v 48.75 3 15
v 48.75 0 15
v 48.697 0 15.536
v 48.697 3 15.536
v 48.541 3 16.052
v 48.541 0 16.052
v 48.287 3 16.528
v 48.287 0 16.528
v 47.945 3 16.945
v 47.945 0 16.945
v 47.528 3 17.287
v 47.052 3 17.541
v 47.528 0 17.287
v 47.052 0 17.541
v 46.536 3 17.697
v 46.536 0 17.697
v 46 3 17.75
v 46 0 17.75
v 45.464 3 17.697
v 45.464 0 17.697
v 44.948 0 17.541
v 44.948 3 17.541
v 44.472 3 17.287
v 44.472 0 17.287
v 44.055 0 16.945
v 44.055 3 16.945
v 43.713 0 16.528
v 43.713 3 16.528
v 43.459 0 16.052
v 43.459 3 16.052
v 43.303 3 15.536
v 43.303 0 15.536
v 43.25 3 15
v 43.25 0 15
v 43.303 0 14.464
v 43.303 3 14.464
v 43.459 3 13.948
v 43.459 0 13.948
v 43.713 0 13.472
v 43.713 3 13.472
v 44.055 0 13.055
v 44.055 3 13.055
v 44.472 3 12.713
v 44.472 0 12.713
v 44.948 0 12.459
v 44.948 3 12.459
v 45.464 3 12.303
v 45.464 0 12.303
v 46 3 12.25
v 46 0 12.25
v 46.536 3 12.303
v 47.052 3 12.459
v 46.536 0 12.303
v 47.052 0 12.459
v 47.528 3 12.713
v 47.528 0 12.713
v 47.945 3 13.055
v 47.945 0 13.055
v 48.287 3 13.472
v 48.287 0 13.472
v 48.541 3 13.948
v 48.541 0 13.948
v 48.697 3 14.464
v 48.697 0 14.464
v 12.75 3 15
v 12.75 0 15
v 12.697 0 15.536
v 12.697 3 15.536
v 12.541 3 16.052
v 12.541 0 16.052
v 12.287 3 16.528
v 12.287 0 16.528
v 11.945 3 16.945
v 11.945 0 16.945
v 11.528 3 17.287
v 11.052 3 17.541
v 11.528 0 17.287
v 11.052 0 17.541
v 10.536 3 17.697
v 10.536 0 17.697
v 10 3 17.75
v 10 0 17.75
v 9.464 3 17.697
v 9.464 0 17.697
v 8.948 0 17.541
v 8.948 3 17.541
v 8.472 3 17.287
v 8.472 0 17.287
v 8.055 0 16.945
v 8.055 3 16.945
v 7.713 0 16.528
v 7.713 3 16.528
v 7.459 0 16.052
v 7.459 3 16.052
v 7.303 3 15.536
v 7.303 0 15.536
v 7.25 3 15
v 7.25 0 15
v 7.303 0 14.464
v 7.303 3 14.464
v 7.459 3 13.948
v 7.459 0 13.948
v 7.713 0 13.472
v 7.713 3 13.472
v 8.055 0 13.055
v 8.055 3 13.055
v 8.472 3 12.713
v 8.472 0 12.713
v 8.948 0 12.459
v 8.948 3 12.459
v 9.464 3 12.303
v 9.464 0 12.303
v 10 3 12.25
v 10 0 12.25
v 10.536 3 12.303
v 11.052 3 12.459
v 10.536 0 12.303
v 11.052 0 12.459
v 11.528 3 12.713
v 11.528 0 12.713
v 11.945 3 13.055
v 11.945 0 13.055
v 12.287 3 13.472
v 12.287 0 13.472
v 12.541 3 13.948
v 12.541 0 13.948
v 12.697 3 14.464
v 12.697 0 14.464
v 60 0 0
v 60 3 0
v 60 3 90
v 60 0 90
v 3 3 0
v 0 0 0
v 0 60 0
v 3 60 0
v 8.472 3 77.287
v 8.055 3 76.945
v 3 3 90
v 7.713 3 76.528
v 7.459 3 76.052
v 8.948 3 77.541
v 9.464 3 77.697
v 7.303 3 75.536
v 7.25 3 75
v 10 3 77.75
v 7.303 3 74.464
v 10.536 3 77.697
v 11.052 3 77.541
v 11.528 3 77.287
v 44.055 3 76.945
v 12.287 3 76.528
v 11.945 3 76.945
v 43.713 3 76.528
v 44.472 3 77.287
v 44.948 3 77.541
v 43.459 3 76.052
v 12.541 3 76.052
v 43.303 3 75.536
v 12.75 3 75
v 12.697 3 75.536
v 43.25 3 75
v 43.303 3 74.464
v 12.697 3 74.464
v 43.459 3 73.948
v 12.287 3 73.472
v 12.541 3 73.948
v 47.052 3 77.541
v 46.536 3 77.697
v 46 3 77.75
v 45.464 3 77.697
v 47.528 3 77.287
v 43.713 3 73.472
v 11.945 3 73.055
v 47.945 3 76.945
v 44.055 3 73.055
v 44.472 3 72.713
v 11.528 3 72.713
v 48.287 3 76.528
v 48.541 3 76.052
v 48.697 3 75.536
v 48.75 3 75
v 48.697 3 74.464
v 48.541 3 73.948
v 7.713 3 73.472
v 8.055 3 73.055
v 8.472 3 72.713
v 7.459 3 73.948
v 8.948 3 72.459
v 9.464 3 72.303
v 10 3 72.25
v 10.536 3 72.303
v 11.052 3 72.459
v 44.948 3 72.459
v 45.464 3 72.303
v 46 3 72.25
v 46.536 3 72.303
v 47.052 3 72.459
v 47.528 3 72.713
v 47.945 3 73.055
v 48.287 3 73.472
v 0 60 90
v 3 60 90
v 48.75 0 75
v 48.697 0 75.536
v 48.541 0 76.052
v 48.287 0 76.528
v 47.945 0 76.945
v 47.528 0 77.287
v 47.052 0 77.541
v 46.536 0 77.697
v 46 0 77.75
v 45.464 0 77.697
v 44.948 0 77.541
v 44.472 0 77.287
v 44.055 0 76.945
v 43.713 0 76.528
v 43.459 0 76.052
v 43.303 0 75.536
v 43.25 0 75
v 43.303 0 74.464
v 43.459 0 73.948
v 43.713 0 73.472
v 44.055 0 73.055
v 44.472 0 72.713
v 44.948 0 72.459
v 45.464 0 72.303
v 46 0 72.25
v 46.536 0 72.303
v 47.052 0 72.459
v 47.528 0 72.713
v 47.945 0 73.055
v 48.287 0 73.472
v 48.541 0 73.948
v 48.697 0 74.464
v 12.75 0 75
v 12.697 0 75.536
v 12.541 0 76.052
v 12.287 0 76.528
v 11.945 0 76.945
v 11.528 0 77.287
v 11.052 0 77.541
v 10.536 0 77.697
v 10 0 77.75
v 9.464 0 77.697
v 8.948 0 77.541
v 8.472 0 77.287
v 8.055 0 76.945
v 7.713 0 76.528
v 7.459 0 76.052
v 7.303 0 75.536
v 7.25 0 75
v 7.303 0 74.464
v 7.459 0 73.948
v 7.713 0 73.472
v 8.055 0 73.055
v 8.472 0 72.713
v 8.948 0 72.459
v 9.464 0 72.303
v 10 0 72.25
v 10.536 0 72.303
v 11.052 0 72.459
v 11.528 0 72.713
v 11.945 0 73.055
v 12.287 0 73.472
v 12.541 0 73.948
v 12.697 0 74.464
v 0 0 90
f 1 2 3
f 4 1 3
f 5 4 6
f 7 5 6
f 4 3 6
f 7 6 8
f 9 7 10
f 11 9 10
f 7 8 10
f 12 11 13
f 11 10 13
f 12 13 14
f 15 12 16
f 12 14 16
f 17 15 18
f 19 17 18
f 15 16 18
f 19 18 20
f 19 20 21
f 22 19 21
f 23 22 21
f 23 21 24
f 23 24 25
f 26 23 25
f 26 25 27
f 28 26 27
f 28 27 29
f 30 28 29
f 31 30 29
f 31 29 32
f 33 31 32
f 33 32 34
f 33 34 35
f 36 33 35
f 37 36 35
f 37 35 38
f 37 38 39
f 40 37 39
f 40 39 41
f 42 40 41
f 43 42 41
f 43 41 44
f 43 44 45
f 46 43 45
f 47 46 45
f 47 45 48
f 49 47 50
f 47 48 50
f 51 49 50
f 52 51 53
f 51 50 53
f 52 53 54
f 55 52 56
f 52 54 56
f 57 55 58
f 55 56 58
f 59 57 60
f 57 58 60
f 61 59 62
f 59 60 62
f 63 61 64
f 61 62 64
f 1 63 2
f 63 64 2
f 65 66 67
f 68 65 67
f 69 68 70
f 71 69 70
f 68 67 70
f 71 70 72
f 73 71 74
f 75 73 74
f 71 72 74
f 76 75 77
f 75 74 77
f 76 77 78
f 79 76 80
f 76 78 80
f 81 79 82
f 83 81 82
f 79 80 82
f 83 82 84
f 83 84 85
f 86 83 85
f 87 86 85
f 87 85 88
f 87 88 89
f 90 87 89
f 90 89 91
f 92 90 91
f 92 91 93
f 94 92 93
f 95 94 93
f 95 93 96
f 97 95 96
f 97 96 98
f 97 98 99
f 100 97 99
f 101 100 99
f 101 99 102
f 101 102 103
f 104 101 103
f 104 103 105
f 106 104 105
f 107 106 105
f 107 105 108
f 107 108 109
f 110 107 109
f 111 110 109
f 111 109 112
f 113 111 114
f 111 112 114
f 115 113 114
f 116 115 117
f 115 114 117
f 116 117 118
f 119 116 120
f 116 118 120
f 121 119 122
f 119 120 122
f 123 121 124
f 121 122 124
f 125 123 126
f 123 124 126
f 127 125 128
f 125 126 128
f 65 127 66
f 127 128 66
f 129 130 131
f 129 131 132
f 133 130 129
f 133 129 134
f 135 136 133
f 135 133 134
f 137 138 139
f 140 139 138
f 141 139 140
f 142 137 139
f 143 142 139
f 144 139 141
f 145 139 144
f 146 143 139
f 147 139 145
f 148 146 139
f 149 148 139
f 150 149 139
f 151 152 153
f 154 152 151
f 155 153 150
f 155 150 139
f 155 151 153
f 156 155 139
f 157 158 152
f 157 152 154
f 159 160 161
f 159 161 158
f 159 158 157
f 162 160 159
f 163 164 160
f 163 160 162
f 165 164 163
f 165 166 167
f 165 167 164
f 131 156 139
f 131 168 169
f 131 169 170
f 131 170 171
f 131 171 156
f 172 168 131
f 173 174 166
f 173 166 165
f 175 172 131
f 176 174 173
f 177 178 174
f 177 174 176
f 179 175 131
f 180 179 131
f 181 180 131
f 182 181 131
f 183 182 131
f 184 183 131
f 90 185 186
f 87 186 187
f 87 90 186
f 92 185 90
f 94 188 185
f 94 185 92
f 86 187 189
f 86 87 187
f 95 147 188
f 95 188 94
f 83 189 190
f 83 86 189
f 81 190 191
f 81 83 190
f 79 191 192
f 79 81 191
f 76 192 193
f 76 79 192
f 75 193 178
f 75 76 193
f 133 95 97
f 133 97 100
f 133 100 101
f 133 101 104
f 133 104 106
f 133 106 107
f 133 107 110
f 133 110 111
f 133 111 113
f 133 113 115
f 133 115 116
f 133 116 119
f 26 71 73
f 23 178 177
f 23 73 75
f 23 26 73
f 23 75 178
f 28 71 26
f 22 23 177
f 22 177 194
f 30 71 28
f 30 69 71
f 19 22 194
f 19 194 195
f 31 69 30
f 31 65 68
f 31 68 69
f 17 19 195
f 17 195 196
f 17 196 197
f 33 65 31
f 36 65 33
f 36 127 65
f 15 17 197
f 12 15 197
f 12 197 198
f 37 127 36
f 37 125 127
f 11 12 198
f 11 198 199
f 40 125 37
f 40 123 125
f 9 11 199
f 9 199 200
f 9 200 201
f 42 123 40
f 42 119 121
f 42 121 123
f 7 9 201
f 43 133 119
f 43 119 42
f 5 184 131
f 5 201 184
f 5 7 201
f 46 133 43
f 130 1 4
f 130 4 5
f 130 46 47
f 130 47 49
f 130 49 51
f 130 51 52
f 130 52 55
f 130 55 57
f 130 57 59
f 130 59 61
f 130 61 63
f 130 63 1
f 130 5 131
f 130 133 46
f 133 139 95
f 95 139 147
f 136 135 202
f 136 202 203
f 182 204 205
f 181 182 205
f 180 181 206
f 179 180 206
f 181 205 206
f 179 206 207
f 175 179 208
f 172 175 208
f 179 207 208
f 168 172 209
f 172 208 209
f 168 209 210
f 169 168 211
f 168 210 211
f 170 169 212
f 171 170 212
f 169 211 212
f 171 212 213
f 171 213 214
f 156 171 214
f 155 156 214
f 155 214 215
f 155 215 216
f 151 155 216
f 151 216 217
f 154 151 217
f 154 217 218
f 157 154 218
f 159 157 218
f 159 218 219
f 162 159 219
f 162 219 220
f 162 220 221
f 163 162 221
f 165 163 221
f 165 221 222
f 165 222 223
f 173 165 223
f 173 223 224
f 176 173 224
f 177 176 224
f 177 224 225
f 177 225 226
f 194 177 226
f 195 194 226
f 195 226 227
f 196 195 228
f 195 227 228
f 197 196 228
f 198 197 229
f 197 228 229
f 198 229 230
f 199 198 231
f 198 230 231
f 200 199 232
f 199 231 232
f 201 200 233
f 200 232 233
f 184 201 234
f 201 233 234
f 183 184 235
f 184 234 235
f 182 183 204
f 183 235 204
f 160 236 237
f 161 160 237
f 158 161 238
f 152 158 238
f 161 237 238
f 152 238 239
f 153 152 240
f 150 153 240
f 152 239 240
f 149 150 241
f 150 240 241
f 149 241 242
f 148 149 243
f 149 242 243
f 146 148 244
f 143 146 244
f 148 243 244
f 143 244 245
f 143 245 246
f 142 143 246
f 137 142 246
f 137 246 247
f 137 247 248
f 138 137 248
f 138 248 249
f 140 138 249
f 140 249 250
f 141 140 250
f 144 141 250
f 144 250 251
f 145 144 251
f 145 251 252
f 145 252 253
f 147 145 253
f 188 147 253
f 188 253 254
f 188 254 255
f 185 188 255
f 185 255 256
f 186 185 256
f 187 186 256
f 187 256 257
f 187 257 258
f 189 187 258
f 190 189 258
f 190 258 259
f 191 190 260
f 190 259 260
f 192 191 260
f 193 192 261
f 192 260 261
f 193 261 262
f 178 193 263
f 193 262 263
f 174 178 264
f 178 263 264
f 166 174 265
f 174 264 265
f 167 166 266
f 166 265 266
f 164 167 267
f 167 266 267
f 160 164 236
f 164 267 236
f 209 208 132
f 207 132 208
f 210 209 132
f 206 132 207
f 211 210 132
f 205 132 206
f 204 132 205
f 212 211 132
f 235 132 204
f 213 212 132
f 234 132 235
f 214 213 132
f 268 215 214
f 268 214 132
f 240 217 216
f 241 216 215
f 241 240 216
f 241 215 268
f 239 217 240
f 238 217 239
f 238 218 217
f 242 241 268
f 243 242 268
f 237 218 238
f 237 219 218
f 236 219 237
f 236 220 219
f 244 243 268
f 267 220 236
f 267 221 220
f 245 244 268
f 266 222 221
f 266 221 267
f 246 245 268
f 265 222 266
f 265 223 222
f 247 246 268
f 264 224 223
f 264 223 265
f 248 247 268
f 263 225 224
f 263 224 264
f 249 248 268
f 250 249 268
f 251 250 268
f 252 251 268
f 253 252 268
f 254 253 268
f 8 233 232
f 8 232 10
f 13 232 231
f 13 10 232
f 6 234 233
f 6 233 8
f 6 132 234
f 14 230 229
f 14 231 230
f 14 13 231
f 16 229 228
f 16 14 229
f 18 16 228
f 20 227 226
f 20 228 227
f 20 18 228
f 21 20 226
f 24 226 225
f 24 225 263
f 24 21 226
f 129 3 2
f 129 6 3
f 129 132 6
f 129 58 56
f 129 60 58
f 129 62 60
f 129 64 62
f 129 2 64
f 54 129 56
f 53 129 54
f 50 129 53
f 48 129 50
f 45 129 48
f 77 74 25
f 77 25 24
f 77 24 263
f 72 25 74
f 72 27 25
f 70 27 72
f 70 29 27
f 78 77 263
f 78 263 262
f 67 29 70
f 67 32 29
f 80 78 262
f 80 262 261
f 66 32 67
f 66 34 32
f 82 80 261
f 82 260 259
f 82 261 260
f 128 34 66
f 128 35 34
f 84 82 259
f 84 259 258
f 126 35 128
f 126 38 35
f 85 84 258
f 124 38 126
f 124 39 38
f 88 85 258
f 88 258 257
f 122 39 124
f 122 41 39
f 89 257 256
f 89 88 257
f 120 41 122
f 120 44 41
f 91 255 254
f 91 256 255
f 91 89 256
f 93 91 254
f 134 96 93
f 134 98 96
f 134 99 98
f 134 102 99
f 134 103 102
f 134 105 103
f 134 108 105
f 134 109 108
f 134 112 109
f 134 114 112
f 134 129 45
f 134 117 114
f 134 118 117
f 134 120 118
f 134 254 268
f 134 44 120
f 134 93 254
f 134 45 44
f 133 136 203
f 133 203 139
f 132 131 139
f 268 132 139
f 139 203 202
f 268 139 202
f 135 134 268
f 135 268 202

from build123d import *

# Parameters (mm, degrees)
EXTRUDE_1_DEPTH     = 90
SKETCH_2_R          = 2.75
CUT_EXTRUDE_1_DEPTH = 124.693168769


with BuildPart() as part:
    # Эскиз1 → Бобышка-Вытянуть1 (new body)
    with BuildSketch(Plane.XY):
        Polygon((0, 0), (0, 60), (3, 60), (3, 3), (60, 3), (60, 0), align=None)
    extrude(amount=EXTRUDE_1_DEPTH)

    # Эскиз2 → Вырез-Вытянуть1 (cut, through all)
    with BuildSketch(Plane.XZ):
        with Locations((10, 75)):
            Circle(SKETCH_2_R)
        with Locations((46, 75)):
            Circle(SKETCH_2_R)
        with Locations((46, 15)):
            Circle(SKETCH_2_R)
        with Locations((10, 15)):
            Circle(SKETCH_2_R)
    extrude(amount=-CUT_EXTRUDE_1_DEPTH, mode=Mode.SUBTRACT)


solid = part.part
